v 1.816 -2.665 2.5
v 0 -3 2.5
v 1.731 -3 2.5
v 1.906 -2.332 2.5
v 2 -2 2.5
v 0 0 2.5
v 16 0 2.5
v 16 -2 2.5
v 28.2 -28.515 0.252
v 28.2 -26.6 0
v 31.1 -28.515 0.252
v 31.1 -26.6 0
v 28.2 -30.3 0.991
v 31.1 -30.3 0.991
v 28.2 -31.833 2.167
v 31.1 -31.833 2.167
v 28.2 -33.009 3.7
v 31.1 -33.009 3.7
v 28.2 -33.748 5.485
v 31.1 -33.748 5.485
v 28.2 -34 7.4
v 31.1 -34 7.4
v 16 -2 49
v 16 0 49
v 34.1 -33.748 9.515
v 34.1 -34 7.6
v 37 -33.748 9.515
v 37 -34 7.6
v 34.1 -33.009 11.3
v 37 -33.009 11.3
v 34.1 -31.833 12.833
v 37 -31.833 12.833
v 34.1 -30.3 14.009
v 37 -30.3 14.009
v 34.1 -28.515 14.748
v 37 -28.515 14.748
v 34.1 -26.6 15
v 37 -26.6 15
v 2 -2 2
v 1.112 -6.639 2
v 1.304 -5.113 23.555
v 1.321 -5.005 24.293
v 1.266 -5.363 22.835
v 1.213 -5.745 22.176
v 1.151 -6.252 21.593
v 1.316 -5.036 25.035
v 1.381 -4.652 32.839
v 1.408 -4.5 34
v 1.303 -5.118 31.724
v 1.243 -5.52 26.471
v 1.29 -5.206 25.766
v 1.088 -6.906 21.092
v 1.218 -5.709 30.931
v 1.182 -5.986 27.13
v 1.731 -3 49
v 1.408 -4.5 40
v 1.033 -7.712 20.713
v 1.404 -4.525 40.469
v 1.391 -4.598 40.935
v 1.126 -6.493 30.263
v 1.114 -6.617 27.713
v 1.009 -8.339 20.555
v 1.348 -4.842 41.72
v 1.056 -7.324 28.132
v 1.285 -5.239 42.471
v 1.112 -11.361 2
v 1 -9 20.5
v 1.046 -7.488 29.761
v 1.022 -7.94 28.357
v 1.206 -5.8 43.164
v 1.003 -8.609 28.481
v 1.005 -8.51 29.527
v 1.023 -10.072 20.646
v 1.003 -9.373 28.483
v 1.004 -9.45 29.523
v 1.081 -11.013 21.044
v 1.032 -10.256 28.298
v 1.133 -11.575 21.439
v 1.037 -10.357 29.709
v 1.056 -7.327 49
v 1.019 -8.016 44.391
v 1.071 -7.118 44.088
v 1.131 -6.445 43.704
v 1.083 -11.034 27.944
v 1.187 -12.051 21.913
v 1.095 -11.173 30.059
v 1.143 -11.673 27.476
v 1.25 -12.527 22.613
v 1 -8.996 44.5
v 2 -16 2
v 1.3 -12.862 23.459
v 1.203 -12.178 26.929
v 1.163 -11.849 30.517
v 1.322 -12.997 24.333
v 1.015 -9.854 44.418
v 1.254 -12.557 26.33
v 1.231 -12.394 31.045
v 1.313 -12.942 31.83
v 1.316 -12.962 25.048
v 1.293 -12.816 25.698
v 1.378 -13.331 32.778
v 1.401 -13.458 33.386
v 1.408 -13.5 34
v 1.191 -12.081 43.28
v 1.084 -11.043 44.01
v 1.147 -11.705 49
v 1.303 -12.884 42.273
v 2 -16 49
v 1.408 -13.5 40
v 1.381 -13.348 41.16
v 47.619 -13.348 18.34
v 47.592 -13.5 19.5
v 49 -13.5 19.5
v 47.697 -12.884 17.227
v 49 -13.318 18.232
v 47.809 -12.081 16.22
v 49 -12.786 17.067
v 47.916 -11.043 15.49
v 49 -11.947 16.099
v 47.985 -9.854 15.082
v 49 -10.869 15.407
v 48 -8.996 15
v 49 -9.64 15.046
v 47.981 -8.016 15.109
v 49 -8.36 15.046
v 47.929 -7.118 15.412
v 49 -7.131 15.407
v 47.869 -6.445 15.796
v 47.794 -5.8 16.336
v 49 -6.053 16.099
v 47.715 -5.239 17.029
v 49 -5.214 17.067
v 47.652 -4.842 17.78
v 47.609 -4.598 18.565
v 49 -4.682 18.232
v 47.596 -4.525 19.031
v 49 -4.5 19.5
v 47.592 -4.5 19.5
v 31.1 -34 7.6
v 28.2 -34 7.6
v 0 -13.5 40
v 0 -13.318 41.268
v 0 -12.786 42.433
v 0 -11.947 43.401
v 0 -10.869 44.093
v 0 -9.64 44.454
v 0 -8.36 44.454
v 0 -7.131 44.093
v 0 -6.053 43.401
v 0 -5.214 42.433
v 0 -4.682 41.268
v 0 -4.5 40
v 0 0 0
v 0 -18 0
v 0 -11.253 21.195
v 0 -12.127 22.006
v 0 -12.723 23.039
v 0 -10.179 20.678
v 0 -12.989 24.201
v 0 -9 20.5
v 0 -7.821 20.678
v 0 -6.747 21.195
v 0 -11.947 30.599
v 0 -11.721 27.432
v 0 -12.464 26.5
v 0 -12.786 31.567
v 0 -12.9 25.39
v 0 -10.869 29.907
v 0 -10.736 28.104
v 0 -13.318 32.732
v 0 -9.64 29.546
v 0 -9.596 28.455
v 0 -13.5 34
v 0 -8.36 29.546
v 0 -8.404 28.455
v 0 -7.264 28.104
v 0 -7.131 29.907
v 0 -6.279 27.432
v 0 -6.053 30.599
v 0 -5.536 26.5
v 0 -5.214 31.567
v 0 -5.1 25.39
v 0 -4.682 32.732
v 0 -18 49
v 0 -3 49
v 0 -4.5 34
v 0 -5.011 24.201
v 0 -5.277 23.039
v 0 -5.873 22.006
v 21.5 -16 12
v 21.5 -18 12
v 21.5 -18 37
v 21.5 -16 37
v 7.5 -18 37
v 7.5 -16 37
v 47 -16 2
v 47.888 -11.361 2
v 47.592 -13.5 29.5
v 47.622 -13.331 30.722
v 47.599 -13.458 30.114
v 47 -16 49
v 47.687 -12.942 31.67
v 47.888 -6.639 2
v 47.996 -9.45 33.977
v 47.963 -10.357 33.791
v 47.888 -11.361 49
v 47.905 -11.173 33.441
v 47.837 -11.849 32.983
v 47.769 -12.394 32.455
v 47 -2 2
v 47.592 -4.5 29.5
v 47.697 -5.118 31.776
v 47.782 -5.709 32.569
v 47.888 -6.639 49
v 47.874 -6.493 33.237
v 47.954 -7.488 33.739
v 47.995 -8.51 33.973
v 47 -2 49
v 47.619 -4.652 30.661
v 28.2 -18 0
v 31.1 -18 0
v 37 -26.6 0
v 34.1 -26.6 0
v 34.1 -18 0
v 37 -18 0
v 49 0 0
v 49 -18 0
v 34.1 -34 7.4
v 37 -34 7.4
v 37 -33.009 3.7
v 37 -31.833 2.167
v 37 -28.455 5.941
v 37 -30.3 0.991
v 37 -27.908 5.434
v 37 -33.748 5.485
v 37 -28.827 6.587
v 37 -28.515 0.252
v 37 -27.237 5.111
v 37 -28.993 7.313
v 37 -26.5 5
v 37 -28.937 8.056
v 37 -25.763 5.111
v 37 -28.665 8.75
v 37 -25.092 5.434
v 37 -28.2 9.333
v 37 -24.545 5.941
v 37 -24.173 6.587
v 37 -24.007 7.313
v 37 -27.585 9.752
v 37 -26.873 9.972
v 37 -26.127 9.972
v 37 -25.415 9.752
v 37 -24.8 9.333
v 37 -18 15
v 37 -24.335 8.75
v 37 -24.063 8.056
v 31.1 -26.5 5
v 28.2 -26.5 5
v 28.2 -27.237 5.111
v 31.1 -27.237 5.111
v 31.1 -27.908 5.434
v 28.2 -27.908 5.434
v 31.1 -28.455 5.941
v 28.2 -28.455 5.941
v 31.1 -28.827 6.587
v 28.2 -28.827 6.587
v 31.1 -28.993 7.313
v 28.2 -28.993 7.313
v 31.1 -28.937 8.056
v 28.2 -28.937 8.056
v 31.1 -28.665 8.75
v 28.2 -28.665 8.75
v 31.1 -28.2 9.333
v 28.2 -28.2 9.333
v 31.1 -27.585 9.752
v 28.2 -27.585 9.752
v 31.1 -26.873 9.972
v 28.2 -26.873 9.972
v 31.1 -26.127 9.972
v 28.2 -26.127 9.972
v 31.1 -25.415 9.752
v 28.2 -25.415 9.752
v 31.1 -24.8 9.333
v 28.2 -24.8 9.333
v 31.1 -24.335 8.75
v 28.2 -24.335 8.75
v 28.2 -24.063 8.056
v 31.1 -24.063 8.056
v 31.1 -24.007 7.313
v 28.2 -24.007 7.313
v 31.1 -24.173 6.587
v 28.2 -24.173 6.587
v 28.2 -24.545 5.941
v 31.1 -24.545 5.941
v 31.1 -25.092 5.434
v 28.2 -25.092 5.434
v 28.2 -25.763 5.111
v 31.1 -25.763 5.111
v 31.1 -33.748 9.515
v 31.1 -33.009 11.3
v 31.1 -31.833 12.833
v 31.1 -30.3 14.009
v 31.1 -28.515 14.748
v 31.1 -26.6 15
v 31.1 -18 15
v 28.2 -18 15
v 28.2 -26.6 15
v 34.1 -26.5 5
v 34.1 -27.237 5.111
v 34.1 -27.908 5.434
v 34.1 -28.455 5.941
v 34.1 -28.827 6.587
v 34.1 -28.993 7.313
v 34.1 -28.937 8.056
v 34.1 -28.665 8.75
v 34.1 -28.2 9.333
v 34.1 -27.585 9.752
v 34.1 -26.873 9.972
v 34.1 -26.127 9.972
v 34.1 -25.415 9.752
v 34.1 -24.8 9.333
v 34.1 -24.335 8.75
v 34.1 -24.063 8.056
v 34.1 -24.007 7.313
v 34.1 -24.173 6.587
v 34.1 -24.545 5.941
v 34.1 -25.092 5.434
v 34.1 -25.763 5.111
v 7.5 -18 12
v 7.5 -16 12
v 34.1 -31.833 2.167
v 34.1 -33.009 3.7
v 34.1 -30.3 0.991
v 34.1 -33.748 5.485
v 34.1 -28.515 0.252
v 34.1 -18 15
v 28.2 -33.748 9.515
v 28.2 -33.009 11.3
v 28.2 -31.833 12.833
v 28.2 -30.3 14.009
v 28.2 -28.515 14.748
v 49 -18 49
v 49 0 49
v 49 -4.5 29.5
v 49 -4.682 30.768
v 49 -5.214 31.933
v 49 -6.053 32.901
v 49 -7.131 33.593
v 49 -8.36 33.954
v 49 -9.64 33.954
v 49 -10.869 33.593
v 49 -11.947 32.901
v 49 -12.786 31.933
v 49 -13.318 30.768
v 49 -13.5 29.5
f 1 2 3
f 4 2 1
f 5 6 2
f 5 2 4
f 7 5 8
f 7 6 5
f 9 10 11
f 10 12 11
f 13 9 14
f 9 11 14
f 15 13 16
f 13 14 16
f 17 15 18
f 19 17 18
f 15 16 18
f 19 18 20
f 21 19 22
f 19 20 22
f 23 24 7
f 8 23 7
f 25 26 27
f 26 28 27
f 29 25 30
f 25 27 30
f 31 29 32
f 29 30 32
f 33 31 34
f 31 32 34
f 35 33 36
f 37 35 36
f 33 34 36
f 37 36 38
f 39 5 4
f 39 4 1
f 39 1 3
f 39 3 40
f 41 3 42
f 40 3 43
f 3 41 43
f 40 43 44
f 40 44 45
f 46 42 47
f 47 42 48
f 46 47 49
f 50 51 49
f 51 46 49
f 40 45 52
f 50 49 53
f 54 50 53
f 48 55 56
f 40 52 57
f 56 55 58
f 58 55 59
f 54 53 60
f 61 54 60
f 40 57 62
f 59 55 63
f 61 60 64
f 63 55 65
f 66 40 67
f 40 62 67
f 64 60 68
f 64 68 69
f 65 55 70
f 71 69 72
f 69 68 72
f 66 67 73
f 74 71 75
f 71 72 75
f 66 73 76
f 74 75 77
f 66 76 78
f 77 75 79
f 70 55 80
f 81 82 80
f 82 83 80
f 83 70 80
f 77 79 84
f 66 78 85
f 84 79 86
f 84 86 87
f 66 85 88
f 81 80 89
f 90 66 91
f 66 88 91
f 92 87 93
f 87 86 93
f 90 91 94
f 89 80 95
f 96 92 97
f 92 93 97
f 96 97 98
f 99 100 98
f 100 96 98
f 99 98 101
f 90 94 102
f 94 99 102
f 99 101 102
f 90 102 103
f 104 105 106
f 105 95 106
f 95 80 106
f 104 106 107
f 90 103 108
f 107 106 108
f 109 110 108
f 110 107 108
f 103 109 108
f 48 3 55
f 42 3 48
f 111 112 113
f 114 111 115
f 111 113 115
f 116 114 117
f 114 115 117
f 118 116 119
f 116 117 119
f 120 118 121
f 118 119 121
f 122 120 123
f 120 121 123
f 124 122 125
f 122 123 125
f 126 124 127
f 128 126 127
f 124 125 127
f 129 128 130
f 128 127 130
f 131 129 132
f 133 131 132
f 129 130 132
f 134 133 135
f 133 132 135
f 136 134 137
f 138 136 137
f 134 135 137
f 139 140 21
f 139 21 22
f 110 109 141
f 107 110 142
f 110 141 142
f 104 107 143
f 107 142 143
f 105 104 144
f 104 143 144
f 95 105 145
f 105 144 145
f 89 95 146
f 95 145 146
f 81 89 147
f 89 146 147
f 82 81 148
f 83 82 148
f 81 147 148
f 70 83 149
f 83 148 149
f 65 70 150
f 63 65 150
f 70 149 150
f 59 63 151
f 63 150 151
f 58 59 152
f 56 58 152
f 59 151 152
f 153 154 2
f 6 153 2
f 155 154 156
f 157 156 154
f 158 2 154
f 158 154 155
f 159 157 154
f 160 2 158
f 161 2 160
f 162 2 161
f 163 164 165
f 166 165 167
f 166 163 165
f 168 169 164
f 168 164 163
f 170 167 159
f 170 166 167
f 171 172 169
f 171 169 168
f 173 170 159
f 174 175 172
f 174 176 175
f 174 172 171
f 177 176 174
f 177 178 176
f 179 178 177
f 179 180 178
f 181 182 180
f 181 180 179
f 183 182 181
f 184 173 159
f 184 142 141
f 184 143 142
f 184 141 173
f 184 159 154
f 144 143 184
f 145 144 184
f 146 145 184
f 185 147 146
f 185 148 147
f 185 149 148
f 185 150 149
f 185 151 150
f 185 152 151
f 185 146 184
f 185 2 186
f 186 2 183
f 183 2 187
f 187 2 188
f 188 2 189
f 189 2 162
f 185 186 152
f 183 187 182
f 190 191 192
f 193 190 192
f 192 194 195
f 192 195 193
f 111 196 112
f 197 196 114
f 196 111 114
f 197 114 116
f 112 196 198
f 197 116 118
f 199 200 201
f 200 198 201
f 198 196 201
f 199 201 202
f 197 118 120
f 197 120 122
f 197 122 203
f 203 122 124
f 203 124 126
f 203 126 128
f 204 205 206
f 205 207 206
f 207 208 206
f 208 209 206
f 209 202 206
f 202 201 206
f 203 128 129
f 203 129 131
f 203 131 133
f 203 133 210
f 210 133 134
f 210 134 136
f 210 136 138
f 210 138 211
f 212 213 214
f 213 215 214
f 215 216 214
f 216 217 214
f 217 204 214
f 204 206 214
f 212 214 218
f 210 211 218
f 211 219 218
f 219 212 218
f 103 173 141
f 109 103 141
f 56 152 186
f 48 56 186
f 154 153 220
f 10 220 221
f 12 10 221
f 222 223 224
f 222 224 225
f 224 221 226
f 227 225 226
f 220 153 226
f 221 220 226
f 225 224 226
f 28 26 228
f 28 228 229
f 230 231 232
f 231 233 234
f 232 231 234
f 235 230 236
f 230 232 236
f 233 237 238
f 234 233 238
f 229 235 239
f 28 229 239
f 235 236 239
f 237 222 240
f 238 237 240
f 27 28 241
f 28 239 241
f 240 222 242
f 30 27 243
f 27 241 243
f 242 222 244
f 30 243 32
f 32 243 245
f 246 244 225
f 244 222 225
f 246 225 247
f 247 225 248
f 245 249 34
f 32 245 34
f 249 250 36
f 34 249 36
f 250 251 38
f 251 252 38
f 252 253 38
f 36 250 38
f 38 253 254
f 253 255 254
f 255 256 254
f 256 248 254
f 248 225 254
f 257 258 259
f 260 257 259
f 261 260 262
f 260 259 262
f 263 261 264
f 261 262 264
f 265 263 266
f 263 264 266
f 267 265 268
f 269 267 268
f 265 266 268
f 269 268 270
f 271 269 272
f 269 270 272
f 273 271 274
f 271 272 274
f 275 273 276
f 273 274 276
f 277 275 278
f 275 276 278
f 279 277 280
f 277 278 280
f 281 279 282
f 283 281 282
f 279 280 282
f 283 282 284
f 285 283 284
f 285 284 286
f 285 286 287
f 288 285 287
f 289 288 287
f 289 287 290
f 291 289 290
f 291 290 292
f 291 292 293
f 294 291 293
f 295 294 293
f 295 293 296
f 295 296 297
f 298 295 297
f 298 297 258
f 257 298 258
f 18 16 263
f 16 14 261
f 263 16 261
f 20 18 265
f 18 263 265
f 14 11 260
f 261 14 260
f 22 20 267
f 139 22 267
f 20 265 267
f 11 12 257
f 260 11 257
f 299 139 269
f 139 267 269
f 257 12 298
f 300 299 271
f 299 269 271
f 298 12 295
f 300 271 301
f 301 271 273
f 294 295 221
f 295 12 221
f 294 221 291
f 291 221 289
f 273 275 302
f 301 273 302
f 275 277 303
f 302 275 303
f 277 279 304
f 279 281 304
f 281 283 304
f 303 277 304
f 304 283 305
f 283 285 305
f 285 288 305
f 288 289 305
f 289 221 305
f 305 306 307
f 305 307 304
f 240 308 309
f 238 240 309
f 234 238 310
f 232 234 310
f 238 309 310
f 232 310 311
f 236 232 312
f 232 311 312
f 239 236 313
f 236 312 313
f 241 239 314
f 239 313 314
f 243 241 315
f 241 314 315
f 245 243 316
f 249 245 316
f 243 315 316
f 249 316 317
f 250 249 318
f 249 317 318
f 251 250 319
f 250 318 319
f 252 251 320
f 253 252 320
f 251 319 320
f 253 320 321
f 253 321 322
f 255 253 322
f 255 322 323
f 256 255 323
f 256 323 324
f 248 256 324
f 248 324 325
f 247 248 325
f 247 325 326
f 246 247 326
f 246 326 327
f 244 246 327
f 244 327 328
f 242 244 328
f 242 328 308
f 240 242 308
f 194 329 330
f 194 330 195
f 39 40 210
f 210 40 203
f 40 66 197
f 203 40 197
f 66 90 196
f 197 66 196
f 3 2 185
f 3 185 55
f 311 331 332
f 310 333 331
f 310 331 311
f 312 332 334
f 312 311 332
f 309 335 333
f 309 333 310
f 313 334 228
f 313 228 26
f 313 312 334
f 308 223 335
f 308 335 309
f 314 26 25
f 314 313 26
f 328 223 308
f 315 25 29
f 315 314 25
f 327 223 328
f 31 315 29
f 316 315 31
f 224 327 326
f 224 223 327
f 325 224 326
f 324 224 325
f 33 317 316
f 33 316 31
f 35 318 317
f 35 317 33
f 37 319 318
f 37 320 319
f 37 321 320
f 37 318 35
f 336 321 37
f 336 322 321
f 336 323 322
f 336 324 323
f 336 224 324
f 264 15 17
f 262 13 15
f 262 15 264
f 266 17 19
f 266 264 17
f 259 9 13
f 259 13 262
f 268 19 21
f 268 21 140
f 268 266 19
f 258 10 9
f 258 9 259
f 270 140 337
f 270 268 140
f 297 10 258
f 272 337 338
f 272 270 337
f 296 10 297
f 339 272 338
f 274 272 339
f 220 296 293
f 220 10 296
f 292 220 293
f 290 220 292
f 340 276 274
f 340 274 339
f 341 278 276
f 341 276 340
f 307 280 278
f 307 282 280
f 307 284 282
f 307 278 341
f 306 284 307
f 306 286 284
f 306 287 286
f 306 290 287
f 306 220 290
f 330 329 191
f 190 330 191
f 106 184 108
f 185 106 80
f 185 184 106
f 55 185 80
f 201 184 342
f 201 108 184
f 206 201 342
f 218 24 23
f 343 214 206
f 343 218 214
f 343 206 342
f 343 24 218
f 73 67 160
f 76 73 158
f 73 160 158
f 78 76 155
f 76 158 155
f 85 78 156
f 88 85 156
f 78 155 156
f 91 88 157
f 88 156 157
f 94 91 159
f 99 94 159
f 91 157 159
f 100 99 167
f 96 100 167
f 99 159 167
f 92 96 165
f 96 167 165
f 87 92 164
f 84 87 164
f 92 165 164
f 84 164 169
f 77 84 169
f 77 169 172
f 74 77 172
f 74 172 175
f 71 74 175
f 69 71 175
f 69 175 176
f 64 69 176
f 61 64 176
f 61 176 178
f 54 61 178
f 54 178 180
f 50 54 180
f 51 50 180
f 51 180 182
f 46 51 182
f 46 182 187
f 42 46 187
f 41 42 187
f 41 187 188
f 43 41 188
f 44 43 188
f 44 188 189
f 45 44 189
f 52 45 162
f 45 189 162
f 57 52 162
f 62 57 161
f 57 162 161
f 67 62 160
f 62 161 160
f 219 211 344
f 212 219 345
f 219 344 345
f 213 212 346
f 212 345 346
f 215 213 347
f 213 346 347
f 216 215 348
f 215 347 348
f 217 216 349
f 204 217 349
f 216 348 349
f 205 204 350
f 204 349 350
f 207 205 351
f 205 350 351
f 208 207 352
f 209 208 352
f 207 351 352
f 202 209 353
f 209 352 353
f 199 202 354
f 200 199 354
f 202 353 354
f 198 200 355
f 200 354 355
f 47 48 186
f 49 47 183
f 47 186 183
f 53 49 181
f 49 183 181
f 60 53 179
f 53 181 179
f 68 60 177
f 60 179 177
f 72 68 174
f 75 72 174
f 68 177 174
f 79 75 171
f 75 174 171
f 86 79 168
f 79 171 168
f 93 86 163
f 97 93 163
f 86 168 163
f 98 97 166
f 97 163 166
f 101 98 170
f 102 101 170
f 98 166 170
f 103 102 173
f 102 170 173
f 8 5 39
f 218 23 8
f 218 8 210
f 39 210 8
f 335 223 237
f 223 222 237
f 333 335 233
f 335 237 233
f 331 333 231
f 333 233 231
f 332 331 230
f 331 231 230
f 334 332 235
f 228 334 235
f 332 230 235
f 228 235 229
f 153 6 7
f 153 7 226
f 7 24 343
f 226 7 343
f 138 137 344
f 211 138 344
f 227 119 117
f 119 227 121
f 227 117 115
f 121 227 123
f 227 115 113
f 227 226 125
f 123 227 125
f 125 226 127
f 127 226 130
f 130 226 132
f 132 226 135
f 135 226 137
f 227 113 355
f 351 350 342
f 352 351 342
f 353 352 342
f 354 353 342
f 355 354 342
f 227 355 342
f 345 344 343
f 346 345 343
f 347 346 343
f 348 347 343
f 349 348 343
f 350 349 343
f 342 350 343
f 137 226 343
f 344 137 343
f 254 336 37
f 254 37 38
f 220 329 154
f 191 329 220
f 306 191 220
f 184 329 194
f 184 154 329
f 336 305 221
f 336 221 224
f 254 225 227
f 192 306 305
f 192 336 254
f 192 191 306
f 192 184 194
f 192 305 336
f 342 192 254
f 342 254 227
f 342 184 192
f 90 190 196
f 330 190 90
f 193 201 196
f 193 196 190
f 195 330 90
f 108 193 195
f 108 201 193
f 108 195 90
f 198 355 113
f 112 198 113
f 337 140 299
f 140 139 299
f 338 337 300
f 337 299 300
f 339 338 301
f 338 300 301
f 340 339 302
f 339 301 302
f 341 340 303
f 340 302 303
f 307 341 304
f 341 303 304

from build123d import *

# Parameters (mm, degrees)
SKETCH_W        = 49
SKETCH_H        = 49
PAD_DEPTH       = 18
POCKET_DEPTH    = 47
SKETCH002_W     = 14
SKETCH002_H     = 25
POCKET001_DEPTH = 5
SKETCH003_W     = 16
SKETCH003_H     = 46.5
POCKET002_DEPTH = 3
SKETCH004_W     = 2.9
SKETCH004_H     = 15
PAD001_DEPTH    = 16
SKETCH005_R     = 2.5
POCKET003_DEPTH = 20.801
POCKET004_DEPTH = 5
POCKET005_DEPTH = 5
FILLET_R        = 7.4
SKETCH008_R     = 4
POCKET006_DEPTH = 5


with BuildPart() as part:
    # Sketch → Pad (new body)
    with BuildSketch(Plane.XZ):
        with Locations((24.5, 24.5)):
            Rectangle(SKETCH_W, SKETCH_H)
    extrude(amount=PAD_DEPTH)

    # Sketch001 (on Face1 of Pad) → Pocket (cut)
    with BuildSketch(Plane(origin=(0, 0, 49), x_dir=(-1, 0, 0), z_dir=(0, 0, 1))):
        with BuildLine():
            Line((-47, 16), (-2, 16))
            ThreePointArc((-2, 2), (-1, 9), (-2, 16))
            Line((-2, 2), (-47, 2))
            ThreePointArc((-47, 16), (-48, 9), (-47, 2))
        make_face()
    extrude(amount=-POCKET_DEPTH, mode=Mode.SUBTRACT)

    # Sketch002 (on Face4 of Pocket) → Pocket001 (cut)
    with BuildSketch(Plane.XZ.offset(18)):
        with Locations((14.5, 24.5)):
            Rectangle(SKETCH002_W, SKETCH002_H)
    extrude(amount=-POCKET001_DEPTH, mode=Mode.SUBTRACT)

    # Sketch003 (on Face3 of Pocket001) → Pocket002 (cut)
    with BuildSketch(Plane(origin=(0, 0, 0), x_dir=(1, 0, 0), z_dir=(0, 1, 0))):
        with Locations((8, -25.75)):
            Rectangle(SKETCH003_W, SKETCH003_H)
    extrude(amount=-POCKET002_DEPTH, mode=Mode.SUBTRACT)

    # Sketch004 (on Face10 of Pocket002) → Pad001 (join)
    with BuildSketch(Plane.XZ.offset(18)):
        with Locations((29.65, 7.5)):
            Rectangle(SKETCH004_W, SKETCH004_H)
        with Locations((35.55, 7.5)):
            Rectangle(SKETCH004_W, SKETCH004_H)
    extrude(amount=PAD001_DEPTH)

    # Sketch005 (on Face19 of Pad001) → Pocket003 (cut, through all)
    with BuildSketch(Plane(origin=(28.2, 0, 0), x_dir=(0, 0, -1), z_dir=(-1, 0, 0))):
        with Locations((-7.5, 26.5)):
            Circle(SKETCH005_R)
    extrude(amount=-POCKET003_DEPTH, mode=Mode.SUBTRACT)

    # Sketch006 (on Face9 of Pocket003) → Pocket004 (cut)
    with BuildSketch(Plane(origin=(49, 0, 0), x_dir=(0, 0, 1), z_dir=(1, 0, 0))):
        with BuildLine():
            ThreePointArc((19.5, 13.5), (15, 9), (19.5, 4.5))
            Line((19.5, 4.5), (29.5, 4.5))
            ThreePointArc((29.5, 4.5), (34, 9), (29.5, 13.5))
            Line((29.5, 13.5), (19.5, 13.5))
        make_face()
    extrude(amount=-POCKET004_DEPTH, mode=Mode.SUBTRACT)

    # Sketch007 (on Face11 of Pocket004) → Pocket005 (cut)
    with BuildSketch(Plane(origin=(0, 0, 0), x_dir=(0, 0, -1), z_dir=(-1, 0, 0))):
        with BuildLine():
            ThreePointArc((-40, 13.5), (-44.5, 9), (-40, 4.5))
            Line((-40, 4.5), (-34, 4.5))
            ThreePointArc((-34, 4.5), (-29.5, 9), (-34, 13.5))
            Line((-34, 13.5), (-40, 13.5))
        make_face()
    extrude(amount=-POCKET005_DEPTH, mode=Mode.SUBTRACT)

    # Fillet
    fillet_edges = [part.edges().sort_by_distance(p)[0] for p in [
        (29.65, -34, 15),
        (35.55, -34, 15),
        (35.55, -34, 0),
        (29.65, -34, 0),
    ]]
    fillet(fillet_edges, radius=FILLET_R)

    # Sketch008 (on Face11 of Fillet) → Pocket006 (cut)
    with BuildSketch(Plane(origin=(0, 0, 0), x_dir=(0, 0, -1), z_dir=(-1, 0, 0))):
        with Locations((-24.5, 9)):
            Circle(SKETCH008_R)
    extrude(amount=-POCKET006_DEPTH, mode=Mode.SUBTRACT)


solid = part.part
